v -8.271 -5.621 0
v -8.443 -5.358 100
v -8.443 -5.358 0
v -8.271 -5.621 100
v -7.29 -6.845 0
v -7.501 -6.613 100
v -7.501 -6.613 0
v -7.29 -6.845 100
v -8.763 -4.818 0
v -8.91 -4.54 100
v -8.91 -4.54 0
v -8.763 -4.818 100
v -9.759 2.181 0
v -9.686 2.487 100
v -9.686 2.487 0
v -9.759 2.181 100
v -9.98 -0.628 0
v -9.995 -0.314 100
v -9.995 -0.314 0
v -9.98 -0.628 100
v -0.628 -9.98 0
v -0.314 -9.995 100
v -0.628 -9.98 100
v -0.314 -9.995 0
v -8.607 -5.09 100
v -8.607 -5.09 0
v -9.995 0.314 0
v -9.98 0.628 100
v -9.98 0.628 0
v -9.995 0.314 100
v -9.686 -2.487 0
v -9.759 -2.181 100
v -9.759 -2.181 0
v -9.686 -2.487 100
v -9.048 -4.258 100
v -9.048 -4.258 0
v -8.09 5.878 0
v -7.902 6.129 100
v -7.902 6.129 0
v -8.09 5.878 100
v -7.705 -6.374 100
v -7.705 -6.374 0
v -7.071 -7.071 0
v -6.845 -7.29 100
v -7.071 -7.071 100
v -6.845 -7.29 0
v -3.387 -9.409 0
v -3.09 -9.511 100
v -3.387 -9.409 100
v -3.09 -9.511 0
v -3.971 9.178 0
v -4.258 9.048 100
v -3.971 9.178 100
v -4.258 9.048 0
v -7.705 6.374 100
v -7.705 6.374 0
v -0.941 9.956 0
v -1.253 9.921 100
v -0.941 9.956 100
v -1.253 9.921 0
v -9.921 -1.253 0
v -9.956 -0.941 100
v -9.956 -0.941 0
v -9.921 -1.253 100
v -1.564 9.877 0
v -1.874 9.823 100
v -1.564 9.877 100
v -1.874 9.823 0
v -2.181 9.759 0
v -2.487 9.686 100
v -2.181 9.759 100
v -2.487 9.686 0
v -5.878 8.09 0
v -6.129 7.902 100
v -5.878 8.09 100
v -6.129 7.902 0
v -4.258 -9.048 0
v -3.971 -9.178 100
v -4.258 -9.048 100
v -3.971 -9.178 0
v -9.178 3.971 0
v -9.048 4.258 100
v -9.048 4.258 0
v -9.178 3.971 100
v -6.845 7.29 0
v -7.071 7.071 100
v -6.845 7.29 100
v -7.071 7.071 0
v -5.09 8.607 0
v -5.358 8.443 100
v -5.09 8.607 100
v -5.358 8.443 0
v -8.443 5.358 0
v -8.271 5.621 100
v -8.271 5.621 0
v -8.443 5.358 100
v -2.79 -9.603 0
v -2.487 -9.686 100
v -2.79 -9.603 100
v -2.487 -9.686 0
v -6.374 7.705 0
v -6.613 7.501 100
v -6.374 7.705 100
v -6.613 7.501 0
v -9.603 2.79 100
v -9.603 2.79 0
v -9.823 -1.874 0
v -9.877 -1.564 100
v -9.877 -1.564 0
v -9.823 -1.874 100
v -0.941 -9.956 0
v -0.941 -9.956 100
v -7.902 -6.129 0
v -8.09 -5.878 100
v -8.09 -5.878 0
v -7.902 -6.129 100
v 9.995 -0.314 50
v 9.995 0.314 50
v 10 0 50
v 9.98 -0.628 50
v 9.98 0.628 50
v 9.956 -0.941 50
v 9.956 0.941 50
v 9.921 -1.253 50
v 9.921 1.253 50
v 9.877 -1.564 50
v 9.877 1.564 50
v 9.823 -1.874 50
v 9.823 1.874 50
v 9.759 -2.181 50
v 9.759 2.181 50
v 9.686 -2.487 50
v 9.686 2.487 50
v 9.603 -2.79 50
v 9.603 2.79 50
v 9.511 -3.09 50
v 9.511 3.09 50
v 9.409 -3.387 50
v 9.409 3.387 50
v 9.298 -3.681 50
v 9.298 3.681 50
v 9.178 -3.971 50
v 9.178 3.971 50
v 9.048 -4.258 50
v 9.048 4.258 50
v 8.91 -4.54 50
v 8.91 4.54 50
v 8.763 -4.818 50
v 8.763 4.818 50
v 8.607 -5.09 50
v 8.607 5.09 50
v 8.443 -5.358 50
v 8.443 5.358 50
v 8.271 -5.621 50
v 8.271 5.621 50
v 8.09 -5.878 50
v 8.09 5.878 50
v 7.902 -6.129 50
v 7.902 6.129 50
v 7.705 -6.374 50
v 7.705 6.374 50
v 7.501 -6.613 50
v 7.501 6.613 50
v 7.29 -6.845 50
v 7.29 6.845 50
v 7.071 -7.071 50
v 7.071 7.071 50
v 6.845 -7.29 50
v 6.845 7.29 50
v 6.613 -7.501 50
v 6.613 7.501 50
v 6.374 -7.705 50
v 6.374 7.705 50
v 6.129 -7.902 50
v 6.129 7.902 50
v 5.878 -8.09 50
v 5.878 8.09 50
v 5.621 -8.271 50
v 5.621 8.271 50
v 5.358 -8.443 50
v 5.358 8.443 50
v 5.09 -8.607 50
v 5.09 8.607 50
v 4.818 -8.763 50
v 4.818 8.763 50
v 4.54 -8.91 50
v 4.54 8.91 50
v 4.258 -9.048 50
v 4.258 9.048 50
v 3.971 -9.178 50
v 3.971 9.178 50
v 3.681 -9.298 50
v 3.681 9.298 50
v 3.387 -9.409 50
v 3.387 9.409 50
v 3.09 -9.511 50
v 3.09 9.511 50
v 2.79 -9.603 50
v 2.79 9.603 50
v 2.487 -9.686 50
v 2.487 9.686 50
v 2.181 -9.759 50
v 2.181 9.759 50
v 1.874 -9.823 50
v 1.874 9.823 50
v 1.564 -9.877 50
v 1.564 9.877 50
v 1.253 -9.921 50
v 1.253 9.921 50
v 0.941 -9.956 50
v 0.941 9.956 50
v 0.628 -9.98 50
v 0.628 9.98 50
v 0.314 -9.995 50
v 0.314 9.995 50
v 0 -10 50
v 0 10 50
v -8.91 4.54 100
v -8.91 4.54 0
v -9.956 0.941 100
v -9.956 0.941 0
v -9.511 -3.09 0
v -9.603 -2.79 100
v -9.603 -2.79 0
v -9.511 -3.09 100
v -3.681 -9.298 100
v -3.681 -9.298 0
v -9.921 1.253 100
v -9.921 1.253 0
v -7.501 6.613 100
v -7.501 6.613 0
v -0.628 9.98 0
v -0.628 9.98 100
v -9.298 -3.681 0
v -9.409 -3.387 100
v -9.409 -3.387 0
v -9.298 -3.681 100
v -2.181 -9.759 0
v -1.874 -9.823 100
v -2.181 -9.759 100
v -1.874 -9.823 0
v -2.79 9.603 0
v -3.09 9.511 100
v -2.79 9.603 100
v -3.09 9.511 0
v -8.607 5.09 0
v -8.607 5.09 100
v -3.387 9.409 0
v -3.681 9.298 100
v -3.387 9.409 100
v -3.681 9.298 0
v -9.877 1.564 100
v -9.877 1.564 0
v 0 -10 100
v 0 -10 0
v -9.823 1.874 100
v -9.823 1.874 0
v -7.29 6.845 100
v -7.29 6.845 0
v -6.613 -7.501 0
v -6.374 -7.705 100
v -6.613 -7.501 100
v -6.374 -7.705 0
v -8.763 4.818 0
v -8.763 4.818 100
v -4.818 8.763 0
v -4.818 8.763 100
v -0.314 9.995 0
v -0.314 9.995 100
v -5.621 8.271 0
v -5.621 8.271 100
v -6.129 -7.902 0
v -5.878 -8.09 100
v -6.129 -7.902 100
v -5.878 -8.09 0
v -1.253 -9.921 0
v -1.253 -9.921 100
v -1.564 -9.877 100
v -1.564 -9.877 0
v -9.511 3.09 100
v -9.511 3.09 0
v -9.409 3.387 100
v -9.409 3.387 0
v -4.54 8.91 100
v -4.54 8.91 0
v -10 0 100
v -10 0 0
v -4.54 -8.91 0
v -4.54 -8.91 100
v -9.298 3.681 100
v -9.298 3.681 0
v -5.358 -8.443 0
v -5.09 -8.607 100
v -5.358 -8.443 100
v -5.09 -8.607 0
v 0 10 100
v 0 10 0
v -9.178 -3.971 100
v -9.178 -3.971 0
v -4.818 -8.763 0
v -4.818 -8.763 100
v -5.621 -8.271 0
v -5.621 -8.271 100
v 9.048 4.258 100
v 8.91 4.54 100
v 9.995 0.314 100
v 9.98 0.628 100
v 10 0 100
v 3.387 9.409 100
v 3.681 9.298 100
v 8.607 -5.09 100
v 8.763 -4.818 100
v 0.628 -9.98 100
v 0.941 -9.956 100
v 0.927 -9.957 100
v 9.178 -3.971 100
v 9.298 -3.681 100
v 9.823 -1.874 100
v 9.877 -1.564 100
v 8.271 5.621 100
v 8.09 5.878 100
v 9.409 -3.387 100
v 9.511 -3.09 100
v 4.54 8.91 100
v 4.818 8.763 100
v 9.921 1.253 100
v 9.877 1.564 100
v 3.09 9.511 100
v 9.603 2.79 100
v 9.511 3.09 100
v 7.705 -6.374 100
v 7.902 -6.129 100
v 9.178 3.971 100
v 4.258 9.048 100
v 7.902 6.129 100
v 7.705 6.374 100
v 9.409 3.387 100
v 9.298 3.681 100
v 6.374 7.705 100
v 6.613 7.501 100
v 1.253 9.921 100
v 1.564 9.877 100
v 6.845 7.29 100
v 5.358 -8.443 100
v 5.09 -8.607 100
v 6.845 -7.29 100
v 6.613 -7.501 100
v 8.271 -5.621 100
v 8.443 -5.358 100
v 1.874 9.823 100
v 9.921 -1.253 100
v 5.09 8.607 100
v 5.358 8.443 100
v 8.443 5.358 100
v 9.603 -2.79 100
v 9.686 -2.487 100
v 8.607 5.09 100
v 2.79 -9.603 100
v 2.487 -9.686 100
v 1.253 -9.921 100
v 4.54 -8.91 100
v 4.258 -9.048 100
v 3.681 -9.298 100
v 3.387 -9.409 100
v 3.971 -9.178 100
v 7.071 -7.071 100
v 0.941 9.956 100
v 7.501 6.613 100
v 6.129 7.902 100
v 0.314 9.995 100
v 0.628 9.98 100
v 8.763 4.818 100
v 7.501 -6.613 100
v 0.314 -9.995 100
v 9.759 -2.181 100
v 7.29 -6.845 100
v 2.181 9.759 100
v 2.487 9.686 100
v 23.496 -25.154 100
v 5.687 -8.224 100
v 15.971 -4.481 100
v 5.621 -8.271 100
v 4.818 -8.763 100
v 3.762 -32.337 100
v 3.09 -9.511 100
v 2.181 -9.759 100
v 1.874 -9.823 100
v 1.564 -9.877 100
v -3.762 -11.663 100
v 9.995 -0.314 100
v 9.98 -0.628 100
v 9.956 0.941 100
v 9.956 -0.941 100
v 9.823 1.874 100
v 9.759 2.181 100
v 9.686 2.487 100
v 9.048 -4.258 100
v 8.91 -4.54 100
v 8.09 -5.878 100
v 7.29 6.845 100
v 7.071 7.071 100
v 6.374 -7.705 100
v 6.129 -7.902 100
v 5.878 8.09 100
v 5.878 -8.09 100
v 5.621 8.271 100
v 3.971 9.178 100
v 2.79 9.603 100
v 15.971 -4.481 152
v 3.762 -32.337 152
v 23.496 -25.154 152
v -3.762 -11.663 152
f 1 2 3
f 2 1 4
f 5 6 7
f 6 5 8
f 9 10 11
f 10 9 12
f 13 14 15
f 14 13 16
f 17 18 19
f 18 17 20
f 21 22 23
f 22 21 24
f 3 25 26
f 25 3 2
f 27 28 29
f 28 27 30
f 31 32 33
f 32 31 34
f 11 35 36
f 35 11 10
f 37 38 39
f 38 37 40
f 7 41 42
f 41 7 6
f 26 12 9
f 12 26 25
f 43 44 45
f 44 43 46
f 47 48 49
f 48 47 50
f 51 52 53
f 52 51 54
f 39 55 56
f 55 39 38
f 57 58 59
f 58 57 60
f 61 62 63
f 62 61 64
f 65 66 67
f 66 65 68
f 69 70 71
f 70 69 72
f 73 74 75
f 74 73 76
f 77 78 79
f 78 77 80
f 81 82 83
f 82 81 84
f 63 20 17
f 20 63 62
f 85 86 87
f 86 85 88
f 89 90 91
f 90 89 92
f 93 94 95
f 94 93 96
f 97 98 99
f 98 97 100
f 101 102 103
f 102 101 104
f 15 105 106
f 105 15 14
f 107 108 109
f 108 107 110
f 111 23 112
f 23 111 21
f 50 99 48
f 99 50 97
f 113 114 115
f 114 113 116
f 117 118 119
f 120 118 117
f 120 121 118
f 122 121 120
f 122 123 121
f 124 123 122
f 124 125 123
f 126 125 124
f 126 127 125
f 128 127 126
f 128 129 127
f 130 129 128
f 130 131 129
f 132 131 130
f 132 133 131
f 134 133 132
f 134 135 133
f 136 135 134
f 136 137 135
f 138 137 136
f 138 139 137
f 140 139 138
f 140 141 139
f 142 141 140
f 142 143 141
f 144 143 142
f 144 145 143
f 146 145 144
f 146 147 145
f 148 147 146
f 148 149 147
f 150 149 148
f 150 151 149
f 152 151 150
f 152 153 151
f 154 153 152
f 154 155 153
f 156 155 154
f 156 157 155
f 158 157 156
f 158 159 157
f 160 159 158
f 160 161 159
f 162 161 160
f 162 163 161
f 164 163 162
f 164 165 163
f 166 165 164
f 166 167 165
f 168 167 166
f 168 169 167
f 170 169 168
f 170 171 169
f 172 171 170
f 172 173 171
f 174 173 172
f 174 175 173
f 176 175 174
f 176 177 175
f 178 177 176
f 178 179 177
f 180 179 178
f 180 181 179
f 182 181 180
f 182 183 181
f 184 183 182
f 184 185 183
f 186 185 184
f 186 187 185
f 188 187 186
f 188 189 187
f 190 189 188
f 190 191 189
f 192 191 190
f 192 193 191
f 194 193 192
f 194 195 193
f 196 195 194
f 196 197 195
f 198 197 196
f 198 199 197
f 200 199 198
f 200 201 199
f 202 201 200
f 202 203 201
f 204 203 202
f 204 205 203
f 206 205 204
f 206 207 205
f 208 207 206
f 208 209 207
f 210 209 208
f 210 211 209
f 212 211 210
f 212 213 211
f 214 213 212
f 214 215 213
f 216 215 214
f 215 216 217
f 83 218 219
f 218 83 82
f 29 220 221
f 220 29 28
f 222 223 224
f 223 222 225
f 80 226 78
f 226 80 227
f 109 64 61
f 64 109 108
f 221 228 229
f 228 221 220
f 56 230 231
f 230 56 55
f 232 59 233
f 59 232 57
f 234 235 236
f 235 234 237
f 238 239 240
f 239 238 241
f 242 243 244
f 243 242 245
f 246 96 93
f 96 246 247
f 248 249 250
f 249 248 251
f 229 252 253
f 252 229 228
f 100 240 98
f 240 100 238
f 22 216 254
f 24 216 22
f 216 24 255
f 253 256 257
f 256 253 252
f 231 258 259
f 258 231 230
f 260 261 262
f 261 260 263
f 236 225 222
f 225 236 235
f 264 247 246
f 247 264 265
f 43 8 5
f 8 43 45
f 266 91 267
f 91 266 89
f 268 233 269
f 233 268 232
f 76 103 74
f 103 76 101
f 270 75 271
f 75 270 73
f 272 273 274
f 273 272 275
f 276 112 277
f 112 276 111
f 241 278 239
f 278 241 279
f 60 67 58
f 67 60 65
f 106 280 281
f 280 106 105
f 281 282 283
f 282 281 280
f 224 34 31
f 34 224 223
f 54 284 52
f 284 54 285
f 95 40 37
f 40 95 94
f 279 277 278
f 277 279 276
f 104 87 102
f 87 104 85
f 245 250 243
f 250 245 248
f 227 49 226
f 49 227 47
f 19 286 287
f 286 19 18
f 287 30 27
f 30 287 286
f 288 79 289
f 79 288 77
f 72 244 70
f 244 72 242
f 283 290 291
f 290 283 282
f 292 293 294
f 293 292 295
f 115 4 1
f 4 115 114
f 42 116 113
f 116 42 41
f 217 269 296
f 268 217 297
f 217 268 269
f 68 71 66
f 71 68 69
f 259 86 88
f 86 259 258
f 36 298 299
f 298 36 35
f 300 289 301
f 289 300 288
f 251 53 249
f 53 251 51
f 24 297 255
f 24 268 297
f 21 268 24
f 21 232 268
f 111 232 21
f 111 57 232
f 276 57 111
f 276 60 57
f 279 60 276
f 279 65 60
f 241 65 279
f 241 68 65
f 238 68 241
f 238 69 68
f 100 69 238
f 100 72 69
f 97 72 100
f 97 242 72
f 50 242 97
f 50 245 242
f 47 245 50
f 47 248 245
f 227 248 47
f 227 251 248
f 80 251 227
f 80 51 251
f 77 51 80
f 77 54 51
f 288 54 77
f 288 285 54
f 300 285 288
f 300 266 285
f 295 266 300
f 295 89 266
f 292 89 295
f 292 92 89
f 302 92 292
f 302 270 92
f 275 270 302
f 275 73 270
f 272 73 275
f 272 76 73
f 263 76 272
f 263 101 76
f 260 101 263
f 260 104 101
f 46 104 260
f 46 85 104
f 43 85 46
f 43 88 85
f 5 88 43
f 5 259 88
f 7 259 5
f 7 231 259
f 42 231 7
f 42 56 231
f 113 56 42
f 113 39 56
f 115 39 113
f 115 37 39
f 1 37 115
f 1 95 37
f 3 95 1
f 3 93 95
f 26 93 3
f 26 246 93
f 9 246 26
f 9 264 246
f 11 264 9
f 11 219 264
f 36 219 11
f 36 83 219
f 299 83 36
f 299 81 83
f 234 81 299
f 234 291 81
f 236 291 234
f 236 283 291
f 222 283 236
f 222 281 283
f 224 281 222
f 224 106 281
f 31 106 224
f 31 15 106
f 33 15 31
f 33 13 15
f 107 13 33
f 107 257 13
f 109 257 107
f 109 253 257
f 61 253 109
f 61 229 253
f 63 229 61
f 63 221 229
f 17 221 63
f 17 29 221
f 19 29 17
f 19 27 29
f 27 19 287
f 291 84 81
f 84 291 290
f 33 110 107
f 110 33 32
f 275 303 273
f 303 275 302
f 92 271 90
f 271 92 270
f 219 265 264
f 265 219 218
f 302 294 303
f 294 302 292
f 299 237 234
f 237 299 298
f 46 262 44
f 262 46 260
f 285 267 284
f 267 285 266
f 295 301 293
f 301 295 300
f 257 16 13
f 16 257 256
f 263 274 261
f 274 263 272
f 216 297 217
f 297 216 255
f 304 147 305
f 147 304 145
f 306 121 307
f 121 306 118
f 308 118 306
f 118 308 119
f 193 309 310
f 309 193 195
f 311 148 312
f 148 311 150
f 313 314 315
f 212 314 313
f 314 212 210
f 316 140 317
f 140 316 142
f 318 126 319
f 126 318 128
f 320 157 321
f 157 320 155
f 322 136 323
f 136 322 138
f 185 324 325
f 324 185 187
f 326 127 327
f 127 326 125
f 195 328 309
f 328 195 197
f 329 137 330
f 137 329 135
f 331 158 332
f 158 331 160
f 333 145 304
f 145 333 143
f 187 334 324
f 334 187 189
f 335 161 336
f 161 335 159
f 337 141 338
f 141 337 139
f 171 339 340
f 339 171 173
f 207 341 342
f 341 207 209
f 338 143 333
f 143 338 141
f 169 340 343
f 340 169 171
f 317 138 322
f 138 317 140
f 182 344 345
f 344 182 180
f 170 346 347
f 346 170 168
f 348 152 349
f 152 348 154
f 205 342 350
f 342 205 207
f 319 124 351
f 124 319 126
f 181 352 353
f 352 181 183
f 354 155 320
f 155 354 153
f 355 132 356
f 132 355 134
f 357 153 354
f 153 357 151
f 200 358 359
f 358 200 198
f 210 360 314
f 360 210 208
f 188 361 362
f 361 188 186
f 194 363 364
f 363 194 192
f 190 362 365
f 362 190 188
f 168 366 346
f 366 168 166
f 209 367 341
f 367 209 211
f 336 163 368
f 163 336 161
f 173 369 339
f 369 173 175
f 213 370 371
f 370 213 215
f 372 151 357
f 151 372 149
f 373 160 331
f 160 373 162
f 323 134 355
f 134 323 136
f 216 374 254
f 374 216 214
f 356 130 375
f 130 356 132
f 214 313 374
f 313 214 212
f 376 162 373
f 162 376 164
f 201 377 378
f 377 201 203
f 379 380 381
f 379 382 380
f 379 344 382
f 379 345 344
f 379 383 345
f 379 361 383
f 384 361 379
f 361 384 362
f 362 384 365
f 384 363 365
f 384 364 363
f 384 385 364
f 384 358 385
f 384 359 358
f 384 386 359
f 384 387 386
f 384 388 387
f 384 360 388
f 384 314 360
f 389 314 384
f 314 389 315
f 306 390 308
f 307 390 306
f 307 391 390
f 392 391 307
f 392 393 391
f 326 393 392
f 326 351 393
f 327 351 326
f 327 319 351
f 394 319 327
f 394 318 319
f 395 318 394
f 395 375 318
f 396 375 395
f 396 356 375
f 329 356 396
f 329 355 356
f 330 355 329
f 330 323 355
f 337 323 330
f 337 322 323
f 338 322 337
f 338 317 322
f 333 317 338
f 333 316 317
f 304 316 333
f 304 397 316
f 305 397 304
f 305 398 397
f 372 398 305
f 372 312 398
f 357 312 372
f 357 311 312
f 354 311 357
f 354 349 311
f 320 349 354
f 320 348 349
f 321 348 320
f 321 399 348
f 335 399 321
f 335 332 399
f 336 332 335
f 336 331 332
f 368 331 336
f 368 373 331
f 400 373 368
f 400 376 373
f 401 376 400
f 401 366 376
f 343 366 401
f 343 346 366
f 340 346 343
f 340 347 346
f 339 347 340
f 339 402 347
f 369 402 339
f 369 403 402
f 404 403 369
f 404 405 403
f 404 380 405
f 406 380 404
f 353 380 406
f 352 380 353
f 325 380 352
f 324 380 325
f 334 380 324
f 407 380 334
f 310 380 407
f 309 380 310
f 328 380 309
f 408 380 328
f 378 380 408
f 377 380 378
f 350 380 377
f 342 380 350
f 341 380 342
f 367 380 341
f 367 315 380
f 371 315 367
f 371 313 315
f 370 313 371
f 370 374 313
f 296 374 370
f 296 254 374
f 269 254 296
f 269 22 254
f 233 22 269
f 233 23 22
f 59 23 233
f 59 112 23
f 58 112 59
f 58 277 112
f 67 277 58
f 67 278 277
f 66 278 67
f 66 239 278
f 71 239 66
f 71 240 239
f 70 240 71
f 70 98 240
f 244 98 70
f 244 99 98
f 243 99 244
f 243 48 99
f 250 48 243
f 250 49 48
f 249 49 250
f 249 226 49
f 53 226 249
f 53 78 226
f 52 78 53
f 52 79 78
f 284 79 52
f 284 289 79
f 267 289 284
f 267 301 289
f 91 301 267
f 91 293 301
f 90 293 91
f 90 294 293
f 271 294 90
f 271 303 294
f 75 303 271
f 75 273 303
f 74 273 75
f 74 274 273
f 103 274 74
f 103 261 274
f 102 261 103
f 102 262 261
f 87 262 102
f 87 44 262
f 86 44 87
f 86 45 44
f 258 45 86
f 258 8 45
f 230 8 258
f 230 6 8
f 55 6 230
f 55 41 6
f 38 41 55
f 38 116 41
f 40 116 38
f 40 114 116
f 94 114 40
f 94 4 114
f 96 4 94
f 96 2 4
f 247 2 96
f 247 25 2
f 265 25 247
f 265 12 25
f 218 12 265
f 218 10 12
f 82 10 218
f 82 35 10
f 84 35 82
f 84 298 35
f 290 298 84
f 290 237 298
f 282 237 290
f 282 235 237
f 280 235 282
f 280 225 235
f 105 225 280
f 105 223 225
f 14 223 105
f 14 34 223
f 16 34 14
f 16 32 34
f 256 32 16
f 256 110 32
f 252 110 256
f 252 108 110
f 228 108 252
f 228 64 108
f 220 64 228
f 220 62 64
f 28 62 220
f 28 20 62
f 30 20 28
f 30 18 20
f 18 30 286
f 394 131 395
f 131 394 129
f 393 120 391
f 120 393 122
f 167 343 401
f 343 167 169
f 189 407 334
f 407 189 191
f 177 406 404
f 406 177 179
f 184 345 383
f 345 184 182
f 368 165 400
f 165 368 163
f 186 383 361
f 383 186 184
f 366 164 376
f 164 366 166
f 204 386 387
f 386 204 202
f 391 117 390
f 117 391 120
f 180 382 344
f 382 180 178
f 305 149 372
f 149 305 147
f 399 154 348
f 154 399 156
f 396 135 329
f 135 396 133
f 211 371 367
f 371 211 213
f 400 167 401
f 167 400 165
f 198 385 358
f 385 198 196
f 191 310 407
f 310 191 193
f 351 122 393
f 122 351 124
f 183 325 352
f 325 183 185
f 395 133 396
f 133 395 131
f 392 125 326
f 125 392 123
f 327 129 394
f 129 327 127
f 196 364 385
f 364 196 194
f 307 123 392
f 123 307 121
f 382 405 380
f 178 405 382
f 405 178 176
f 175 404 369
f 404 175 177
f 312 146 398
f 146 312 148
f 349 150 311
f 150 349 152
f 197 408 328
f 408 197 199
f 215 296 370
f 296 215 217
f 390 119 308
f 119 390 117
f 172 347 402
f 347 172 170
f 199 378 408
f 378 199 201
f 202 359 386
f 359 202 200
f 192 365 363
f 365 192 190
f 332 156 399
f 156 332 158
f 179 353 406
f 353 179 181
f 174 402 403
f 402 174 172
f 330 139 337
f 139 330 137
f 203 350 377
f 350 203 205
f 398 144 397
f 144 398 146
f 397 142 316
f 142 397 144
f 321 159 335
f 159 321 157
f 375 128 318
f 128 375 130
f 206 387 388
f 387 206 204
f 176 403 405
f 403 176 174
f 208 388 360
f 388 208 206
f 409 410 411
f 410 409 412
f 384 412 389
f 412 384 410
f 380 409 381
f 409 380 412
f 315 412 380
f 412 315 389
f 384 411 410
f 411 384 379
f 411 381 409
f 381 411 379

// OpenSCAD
// file: monitormount_half_shell.scad
$fn=200;
mm_pipe_diameter=21.5; // Use the real measure of your pipe here. One size will be reduced by "mm_pipe_reduction" to obtain a clamping effect
mm_pipe_reduction=0.5; // Reduce the pipe size to clamp the pipes
w=60; // You can play around here. I used xx mm for my 4 24" Zoll monitors.
mm_thickness=4; // The material thickness. I used xx mm.
mm_holder_depth=12; // The width of the holder for the screws. Recommended: 12mm. It will be integrated 2 mm into the cube, in reality you get ~10mm when using 12mm. 
mm_holder_thickness=4; // The thickness of the holder for the screws. Recommended: 4mm, max. 6.
mm_screw_diameter=5; // The diameter of the screws you want to use

// w   = width
// h   = height
// t   = thickness
// shd = screw hole diameter
// shc = screw hole count
module mm_holder_plate(w, d, t, shd, shc) {
    difference() {
        
        // Create the base plate
        cube([w, d, t]);
    }
    
}

module mm_reinforcement(w, h, t) {

            linear_extrude(t)
            polygon(points=[
                [0, 0],
                [0, w],
                [h, 0]
            ]);
}

module mm_holder(w, shc) {

    _reinforcement_distance = (w - mm_holder_thickness * (shc + 1)) / shc;
    difference() {

        union() {
            cylinder(h=w, r=mm_pipe_diameter/2 + mm_thickness);

            color("lightgreen")
            translate([0, - mm_pipe_diameter / 2 - mm_holder_depth - mm_thickness + 2, w])
            rotate([0,90,0])
            mm_holder_plate(w, mm_holder_depth, mm_holder_thickness, mm_screw_diameter, shc);

            color("lightgreen")
            translate([mm_holder_thickness, mm_pipe_diameter /2 + mm_holder_depth + mm_thickness - 2, w])
            rotate([180,90,0])
            mm_holder_plate(w, mm_holder_depth, mm_holder_thickness, mm_screw_diameter, shc);

            // reinforcements
            for(i = [0 : 1 : shc]) {
                // Add the reinforcements side 1
                color("grey")
                translate([mm_holder_thickness, 0, _reinforcement_distance * i + mm_holder_thickness * i])
                mm_reinforcement(mm_holder_depth + mm_pipe_diameter / 2 + mm_holder_thickness - 2, mm_pipe_diameter / 2 , mm_holder_thickness);

                // Add the reinforcements side 2
                color("grey")
                rotate([180,0,0])
                translate([mm_holder_thickness, 0, - _reinforcement_distance * i - mm_holder_thickness * (i + 1)])
                mm_reinforcement(mm_holder_depth + mm_pipe_diameter / 2 + mm_holder_thickness - 2, mm_pipe_diameter / 2 , mm_holder_thickness);
            }

        }

        color("red")
        translate([0,0,-1])
        cylinder(h=w + 2, r=mm_pipe_diameter/2);

        color("red")
        translate([-mm_pipe_diameter / 2 - mm_thickness, - mm_pipe_diameter / 2 - mm_thickness - 1, -1])
        cube([mm_pipe_diameter / 2 + mm_thickness, mm_pipe_diameter + mm_thickness * 2 + 2, w + 2]);

        color("red")
        translate([-mm_pipe_diameter / 2 - mm_thickness, - mm_pipe_diameter / 2 - mm_thickness - 2 - mm_holder_depth, -1])
        cube([mm_pipe_diameter / 2 + mm_thickness + mm_pipe_reduction, mm_pipe_diameter + mm_thickness * 2 + + mm_holder_depth * 2 + 4, w + 2]);

        // Cut out screw holes
        for(i = [1 : 1 : shc]) {
            
            // Screw holes side 1
            color("red")
            translate([mm_holder_thickness - mm_holder_thickness - 1, mm_holder_depth + 7, _reinforcement_distance * i + mm_holder_thickness * i - _reinforcement_distance / 2])
            rotate([0,90,0])
            cylinder(mm_holder_thickness + 2, r=mm_screw_diameter/2);

            // Screw holes side 2
            color("red")
            translate([mm_holder_thickness - mm_holder_thickness - 1, - mm_holder_depth - 7, _reinforcement_distance * i + mm_holder_thickness * i - _reinforcement_distance / 2])
            rotate([0,90,0])
            cylinder(mm_holder_thickness + 2, r=mm_screw_diameter/2);
        }
    }
}

mm_holder(80,5);
// main file
$fn=200;
mm_pipe_diameter=21.5; // Use the real measure of your pipe here. One size will be reduced by "mm_pipe_reduction" to obtain a clamping effect.
mm_thickness=4; // Take the same value as in the "half_shell" file. 
mm_holder_depth=12; // Take the same value as in the "half_shell" file. 
mm_width_straight=100; // Take the same value as in the "half_shell" file.
mm_angle=20; // The angle with which the two parts are joined together.
mm_width_angled=100; // The high of the vertical holder.
mm_screw_count=5; // The number of screws on each side.

use <./monitormount_half_shell.scad>

module mm_connector(h, d, a) {
    
    difference() {
        union() {
            difference() {
                cylinder(h = h/2, r = d / 2);
                
                color("red")
                translate([0, - d / 2 - 1, -1])
                cube([d / 2 + 1, d + 2, h / 2 + 1]);
            }

            difference() {
                color("lightgreen")
                translate([0, 0, h / 2])
                cylinder(h = h / 2, r = d / 2);


            }
        }        
    }

    color("red")
    translate([0, - d - 2, h / 2])
    rotate([0, 0, a])
    translate([0, - d / 2 - 1, h / 2])
    cube([d / 1 + 1, d + 2, h / 2 + 2]);
}

mm_connector(100, 20, 20);

// difference() {
//     union() {
//         // straight element
//         translate([0, 0, 0])
//         mm_holder(mm_width_straight, mm_screw_count);

//         // element with angle
//         translate([0, 0, mm_width_straight / 2])
//         rotate([0,mm_angle,0])
//         translate([0, mm_pipe_diameter + mm_thickness + mm_holder_depth * 2, -mm_width_straight / 2])
//         mm_holder(mm_width_angled, mm_screw_count);


//         //create the "connection cube" at the straight element
//         mm_cyl_size = mm_pipe_diameter * 2 + mm_holder_depth * 2 + mm_thickness * 3;
//         color("pink")
//         translate([1, mm_cyl_size - mm_pipe_diameter / 2 - mm_thickness,  mm_width_straight / 2])
//         rotate([90,180,0])
//         mm_connector(mm_cyl_size, mm_pipe_diameter * 2);
//     }

//     //Remove the pipes again 
//     color("red")
//     translate([0, 0, -1])
//     cylinder(h=mm_width_straight + 2, r=mm_pipe_diameter/2);

//     color("red")
//     translate([0, 0, mm_width_straight / 2])
//     rotate([0,mm_angle,0])
//     translate([0, mm_pipe_diameter + mm_thickness + mm_holder_depth * 2, -mm_width_straight / 2 -1])
//     cylinder(h=mm_width_straight + 2, r=mm_pipe_diameter/2);
// }
